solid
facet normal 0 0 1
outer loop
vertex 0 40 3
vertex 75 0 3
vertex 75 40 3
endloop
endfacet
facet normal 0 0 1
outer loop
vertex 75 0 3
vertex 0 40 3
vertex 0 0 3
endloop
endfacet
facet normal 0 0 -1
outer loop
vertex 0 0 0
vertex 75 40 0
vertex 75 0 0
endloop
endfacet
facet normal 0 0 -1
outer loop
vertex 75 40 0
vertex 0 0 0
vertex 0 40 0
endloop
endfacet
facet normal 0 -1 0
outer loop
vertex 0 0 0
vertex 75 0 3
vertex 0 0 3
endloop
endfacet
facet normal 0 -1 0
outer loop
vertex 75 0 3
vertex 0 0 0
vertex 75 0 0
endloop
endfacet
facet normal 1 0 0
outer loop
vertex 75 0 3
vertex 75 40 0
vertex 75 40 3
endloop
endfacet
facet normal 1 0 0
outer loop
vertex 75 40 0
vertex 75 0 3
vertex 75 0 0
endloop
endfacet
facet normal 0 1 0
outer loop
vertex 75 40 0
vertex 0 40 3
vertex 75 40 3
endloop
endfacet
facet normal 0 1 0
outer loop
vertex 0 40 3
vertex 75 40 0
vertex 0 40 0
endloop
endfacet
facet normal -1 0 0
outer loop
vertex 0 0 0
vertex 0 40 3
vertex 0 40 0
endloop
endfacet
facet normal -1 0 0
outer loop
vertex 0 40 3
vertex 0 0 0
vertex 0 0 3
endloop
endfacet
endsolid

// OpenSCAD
$fn=360;
//67x93x22
x=75;
y=40;
z=3;
  translate([0,0,0])
  cube([x,y,z]);
